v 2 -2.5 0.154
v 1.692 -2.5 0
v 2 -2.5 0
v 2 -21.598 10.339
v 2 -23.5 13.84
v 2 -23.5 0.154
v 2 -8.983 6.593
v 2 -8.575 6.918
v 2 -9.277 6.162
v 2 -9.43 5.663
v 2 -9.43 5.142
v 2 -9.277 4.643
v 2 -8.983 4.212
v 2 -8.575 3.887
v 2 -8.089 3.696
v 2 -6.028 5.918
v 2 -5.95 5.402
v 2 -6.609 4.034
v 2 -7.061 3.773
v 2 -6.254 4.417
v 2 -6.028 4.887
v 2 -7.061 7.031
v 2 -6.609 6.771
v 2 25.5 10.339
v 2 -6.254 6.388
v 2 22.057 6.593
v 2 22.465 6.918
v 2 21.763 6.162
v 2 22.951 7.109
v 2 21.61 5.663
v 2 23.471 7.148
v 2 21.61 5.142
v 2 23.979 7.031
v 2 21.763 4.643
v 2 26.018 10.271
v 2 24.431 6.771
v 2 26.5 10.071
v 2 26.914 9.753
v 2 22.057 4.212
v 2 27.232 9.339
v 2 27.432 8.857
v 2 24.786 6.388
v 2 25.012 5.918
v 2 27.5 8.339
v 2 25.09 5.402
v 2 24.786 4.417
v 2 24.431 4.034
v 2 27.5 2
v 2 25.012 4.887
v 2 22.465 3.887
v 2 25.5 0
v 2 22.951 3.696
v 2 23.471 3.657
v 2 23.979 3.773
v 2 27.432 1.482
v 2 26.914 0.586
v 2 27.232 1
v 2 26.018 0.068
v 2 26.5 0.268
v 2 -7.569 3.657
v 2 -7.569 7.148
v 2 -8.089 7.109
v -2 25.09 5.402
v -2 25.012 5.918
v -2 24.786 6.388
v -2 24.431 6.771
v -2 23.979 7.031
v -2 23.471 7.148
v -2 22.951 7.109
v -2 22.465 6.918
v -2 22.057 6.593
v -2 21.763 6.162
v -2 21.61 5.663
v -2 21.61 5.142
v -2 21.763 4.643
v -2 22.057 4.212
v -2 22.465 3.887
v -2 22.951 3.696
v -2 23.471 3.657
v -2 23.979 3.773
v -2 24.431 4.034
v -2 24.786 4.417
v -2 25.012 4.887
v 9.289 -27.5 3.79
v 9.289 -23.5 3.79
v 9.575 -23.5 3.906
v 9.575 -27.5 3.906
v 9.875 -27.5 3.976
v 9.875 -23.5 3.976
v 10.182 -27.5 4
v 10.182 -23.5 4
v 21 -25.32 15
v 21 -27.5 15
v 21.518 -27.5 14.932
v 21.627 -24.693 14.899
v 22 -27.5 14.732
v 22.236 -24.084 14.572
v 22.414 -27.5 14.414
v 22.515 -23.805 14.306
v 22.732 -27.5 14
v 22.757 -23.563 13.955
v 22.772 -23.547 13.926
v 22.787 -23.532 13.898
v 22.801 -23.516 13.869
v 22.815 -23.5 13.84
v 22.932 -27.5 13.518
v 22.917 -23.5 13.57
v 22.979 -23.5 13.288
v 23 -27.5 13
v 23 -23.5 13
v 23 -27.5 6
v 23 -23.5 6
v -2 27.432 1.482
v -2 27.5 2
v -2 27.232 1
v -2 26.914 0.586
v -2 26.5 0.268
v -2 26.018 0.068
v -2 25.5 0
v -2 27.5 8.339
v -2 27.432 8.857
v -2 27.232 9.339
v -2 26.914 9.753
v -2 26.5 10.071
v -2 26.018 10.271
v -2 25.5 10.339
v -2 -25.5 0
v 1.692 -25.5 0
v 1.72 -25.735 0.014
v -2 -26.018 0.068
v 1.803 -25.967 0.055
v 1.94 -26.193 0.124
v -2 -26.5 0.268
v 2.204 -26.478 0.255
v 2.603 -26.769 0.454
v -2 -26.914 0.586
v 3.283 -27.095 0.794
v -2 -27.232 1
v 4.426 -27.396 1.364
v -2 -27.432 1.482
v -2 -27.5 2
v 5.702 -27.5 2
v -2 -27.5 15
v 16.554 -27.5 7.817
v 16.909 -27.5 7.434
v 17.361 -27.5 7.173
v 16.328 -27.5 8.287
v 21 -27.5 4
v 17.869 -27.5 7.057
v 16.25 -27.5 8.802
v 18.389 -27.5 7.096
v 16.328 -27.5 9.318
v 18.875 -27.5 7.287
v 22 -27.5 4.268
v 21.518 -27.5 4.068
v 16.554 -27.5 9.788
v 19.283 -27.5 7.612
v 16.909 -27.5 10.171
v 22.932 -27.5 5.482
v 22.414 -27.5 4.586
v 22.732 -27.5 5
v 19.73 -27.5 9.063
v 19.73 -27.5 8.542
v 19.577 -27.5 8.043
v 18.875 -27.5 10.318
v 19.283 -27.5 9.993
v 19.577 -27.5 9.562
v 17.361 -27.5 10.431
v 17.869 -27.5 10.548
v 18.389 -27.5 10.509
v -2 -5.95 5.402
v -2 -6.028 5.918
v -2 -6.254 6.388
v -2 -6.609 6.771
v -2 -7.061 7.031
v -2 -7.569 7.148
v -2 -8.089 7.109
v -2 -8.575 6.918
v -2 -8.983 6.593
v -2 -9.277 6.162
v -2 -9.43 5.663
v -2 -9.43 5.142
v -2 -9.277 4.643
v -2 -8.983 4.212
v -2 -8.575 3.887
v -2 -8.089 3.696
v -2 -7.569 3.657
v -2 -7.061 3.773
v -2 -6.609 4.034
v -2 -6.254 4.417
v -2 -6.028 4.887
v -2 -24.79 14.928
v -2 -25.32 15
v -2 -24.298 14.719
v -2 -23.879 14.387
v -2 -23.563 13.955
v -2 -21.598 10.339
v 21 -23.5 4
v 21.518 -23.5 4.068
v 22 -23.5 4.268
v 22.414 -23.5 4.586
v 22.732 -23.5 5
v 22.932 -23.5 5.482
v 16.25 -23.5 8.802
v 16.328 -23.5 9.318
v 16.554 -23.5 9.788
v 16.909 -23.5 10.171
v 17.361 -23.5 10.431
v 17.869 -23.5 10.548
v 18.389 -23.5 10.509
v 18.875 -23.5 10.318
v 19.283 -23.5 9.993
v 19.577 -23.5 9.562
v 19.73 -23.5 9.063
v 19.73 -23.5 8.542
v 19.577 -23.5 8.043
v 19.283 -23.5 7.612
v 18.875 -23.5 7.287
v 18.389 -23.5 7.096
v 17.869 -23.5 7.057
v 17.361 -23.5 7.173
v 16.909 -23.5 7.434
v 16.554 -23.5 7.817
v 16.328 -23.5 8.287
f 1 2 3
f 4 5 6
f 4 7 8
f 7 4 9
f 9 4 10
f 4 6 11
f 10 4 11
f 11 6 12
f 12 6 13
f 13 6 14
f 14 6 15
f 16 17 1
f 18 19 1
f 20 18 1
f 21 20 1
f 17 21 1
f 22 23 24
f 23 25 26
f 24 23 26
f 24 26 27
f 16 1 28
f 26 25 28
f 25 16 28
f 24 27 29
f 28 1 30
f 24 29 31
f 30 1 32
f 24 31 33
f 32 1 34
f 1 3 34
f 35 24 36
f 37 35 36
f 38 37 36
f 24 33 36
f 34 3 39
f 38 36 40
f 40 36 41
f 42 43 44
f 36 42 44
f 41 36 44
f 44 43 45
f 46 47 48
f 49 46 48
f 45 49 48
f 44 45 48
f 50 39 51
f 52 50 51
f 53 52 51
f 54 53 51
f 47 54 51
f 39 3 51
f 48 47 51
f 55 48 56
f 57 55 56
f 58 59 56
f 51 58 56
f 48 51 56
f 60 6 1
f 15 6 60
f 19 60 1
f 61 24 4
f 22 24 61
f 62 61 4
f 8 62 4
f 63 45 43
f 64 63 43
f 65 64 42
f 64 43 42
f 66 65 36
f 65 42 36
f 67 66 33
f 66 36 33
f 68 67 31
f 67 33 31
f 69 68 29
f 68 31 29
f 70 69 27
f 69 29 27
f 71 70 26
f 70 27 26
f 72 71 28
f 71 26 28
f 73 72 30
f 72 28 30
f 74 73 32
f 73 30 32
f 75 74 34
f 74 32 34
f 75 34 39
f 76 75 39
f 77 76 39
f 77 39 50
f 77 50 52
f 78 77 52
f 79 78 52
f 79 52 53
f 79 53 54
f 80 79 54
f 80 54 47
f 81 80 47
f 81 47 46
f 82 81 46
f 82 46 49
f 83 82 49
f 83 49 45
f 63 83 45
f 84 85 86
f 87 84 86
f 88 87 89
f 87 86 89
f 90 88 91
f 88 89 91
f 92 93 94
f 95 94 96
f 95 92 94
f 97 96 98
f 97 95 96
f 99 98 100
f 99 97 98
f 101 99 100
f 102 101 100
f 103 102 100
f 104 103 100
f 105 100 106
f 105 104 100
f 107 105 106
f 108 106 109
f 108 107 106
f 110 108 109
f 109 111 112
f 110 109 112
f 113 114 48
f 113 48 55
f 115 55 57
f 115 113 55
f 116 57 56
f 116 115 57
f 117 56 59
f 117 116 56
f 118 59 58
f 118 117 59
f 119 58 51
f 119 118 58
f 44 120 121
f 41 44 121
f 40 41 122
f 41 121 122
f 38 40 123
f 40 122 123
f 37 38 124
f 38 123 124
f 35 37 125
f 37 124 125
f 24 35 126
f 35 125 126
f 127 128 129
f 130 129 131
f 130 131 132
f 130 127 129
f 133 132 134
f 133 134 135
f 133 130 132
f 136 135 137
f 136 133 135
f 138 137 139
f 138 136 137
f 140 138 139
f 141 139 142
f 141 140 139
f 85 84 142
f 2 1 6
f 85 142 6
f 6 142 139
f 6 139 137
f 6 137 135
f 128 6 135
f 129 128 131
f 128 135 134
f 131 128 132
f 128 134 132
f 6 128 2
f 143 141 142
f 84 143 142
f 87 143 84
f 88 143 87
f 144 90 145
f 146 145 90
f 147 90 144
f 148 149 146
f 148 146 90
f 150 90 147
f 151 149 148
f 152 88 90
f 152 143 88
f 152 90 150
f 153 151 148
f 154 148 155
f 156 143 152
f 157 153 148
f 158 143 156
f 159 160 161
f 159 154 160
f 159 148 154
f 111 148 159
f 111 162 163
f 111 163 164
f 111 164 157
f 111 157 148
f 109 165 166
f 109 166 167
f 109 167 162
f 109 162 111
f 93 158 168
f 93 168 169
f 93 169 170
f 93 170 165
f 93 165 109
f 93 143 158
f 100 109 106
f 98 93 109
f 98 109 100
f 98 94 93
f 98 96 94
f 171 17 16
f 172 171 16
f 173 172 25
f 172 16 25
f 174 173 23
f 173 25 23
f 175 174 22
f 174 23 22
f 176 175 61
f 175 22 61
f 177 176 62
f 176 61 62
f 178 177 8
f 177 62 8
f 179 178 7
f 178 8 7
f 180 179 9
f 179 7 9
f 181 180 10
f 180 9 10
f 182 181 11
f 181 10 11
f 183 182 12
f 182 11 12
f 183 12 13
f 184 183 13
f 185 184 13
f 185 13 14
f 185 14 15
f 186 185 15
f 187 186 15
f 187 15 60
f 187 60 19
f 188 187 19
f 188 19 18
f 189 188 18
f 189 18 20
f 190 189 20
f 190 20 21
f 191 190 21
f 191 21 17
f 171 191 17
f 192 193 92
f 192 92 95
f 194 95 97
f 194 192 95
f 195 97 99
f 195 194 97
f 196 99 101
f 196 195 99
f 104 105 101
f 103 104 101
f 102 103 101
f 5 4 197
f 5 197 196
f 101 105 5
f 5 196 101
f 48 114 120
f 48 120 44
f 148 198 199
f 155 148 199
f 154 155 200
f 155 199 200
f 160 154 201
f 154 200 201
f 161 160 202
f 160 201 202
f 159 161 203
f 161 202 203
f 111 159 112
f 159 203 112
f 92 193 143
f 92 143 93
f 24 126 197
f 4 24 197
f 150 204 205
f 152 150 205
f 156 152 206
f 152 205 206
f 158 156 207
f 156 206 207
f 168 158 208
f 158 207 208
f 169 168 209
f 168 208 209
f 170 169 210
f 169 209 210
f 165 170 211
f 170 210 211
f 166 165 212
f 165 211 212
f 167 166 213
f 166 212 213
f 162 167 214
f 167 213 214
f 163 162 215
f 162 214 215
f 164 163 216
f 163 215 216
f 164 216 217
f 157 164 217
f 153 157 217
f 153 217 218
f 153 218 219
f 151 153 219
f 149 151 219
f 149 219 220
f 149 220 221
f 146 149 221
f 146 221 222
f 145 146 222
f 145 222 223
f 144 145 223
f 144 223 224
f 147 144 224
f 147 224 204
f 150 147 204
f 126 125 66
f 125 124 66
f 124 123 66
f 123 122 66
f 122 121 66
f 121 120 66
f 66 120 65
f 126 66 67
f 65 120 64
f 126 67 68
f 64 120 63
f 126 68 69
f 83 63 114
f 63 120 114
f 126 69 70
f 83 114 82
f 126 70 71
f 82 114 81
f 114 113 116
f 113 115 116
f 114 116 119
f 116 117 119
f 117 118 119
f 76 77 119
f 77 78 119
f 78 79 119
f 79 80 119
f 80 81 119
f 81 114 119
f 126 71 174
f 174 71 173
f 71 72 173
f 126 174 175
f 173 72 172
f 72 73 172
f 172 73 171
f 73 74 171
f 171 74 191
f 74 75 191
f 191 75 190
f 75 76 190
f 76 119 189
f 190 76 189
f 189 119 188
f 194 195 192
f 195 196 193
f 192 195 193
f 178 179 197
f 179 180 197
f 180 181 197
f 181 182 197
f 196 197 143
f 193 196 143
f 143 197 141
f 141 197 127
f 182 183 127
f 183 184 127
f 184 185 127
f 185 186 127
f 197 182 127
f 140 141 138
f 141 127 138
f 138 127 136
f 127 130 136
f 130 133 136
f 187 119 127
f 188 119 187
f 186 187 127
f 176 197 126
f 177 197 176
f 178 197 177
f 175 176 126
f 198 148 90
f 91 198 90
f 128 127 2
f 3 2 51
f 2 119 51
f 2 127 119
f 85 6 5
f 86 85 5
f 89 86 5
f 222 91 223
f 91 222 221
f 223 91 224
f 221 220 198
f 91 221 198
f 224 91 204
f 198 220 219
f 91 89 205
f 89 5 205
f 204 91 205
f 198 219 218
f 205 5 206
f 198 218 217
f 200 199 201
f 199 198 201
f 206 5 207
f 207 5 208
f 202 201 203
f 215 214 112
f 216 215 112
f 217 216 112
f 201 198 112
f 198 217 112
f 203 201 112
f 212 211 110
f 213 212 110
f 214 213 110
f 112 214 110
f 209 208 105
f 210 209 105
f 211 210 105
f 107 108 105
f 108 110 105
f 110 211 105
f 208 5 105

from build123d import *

# Parameters (mm, degrees)
F0_W         = 4
F0_H         = 51
F0_H_2       = 4
F0_W_2       = 21
F1_DEPTH     = 15
F4_D         = 3.5
F4_ON_F3_D   = 3.5
F5_DEPTH     = 25
F6_DEPTH     = 25
F7_T1_DEPTH  = 4
F7_T3_DEPTH  = 14
F7_T5_DEPTH  = 13.3694414049
F7_T7_DEPTH  = 14
F7_T9_DEPTH  = 30.9469097591
F7_T11_DEPTH = 13.6920837807


# Not quite as in the source:
# - a fillet or chamfer that OpenCascade refuses, or shapes differently, is made with other operations: its cross-section is extruded or revolved along the edge and cut away or added


with BuildPart() as f1:
    # F0 (on Top) → F1 (new body)
    with BuildSketch(Plane.XY):
        with Locations((0, 2)):
            Rectangle(F0_W, F0_H)
        with Locations((0, -25.5)):
            Rectangle(F0_W, F0_H_2)
        with Locations((12.5, -25.5)):
            Rectangle(F0_W_2, F0_H_2)
    extrude(amount=F1_DEPTH)

    # F4 (through all)
    with Locations(Plane(origin=(-2, 0, 0), x_dir=(0, -1, 0), z_dir=(-1, 0, 0))):
        with Locations((-23.34, 5.4024579003), (7.7, 5.4024579003)):
            Hole(F4_D / 2)

    # F4 on F3 (through all)
    with Locations(Plane.XZ.offset(27.5)):
        with Locations((18, 8.8024579003)):
            Hole(F4_ON_F3_D / 2)

    # F2 (on face) → F5 (cut)
    with BuildSketch(Plane(origin=(-2, 0, 0), x_dir=(0, -1, 0), z_dir=(-1, 0, 0))):
        Polygon((-27.5, 15), (-27.5, 10.3389231786), (21.5976021229, 10.3389231786), (24.1305585951, 15), align=None)
    extrude(amount=-F5_DEPTH, mode=Mode.SUBTRACT)

    # F3 (on face) → F6 (cut)
    with BuildSketch(Plane.XZ.offset(27.5)):
        Polygon((23, 0), (23, 4), (9.7110802308, 4), (1.6920837807, 0), align=None)
    extrude(amount=-F6_DEPTH, mode=Mode.SUBTRACT)

    # F7: fillet of radius 2 on 7 edges, made by hand

    # F7_s2 → F7_t1 (join)
    with BuildSketch(Plane.XZ.offset(23.5)):
        with BuildLine():
            ThreePointArc((9.2894845277, 3.7897015141), (9.7236323162, 3.9467155709), (10.1822154449, 4))
            Line((10.1822154449, 4), (9.7110802308, 4))
            Line((9.7110802308, 4), (9.2894845277, 3.7897015141))
        make_face()
    extrude(amount=F7_T1_DEPTH)

    # F7_s4 → F7_t3 (cut)
    with BuildSketch(Plane.YZ.offset(-7)):
        with BuildLine():
            ThreePointArc((27.5, 8.3389231786), (26.9142135624, 9.753136741), (25.5, 10.3389231786))
            Line((25.5, 10.3389231786), (27.5, 10.3389231786))
            Line((27.5, 10.3389231786), (27.5, 8.3389231786))
        make_face()
        with BuildLine():
            ThreePointArc((27.5, 2), (26.9142135624, 0.5857864376), (25.5, 0))
            Line((25.5, 0), (27.5, 0))
            Line((27.5, 0), (27.5, 2))
        make_face()
    extrude(amount=F7_T3_DEPTH, mode=Mode.SUBTRACT)

    # F7_s6 → F7_t5 (cut)
    with BuildSketch(Plane.XZ.offset(19.1305585951)):
        with BuildLine():
            ThreePointArc((21, 15), (22.4142135624, 14.4142135624), (23, 13))
            Line((23, 13), (23, 15))
            Line((23, 15), (21, 15))
        make_face()
    extrude(amount=F7_T5_DEPTH, mode=Mode.SUBTRACT)

    # F7_s8 → F7_t7 (cut)
    with BuildSketch(Plane.XZ.offset(18.5)):
        with BuildLine():
            ThreePointArc((21, 4), (22.4142135624, 4.5857864376), (23, 6))
            Line((23, 6), (23, 4))
            Line((23, 4), (21, 4))
        make_face()
    extrude(amount=F7_T7_DEPTH, mode=Mode.SUBTRACT)

    # F7_s10 → F7_t9 (cut)
    with BuildSketch(Plane.YZ.offset(-4.9734548795)):
        with BuildLine():
            ThreePointArc((-25.3199405469, 15), (-24.2976673595, 14.7189989908), (-23.5626539694, 13.9549575303))
            Line((-23.5626539694, 13.9549575303), (-24.1305585951, 15))
            Line((-24.1305585951, 15), (-25.3199405469, 15))
        make_face()
    extrude(amount=F7_T9_DEPTH, mode=Mode.SUBTRACT)

    # F7_s12 → F7_t11 (cut)
    with BuildSketch(Plane.YZ.offset(-7)):
        with BuildLine():
            ThreePointArc((-25.5, 0), (-26.9142135624, 0.5857864376), (-27.5, 2))
            Line((-27.5, 2), (-27.5, 0))
            Line((-27.5, 0), (-25.5, 0))
        make_face()
    extrude(amount=F7_T11_DEPTH, mode=Mode.SUBTRACT)


solid = f1.part
